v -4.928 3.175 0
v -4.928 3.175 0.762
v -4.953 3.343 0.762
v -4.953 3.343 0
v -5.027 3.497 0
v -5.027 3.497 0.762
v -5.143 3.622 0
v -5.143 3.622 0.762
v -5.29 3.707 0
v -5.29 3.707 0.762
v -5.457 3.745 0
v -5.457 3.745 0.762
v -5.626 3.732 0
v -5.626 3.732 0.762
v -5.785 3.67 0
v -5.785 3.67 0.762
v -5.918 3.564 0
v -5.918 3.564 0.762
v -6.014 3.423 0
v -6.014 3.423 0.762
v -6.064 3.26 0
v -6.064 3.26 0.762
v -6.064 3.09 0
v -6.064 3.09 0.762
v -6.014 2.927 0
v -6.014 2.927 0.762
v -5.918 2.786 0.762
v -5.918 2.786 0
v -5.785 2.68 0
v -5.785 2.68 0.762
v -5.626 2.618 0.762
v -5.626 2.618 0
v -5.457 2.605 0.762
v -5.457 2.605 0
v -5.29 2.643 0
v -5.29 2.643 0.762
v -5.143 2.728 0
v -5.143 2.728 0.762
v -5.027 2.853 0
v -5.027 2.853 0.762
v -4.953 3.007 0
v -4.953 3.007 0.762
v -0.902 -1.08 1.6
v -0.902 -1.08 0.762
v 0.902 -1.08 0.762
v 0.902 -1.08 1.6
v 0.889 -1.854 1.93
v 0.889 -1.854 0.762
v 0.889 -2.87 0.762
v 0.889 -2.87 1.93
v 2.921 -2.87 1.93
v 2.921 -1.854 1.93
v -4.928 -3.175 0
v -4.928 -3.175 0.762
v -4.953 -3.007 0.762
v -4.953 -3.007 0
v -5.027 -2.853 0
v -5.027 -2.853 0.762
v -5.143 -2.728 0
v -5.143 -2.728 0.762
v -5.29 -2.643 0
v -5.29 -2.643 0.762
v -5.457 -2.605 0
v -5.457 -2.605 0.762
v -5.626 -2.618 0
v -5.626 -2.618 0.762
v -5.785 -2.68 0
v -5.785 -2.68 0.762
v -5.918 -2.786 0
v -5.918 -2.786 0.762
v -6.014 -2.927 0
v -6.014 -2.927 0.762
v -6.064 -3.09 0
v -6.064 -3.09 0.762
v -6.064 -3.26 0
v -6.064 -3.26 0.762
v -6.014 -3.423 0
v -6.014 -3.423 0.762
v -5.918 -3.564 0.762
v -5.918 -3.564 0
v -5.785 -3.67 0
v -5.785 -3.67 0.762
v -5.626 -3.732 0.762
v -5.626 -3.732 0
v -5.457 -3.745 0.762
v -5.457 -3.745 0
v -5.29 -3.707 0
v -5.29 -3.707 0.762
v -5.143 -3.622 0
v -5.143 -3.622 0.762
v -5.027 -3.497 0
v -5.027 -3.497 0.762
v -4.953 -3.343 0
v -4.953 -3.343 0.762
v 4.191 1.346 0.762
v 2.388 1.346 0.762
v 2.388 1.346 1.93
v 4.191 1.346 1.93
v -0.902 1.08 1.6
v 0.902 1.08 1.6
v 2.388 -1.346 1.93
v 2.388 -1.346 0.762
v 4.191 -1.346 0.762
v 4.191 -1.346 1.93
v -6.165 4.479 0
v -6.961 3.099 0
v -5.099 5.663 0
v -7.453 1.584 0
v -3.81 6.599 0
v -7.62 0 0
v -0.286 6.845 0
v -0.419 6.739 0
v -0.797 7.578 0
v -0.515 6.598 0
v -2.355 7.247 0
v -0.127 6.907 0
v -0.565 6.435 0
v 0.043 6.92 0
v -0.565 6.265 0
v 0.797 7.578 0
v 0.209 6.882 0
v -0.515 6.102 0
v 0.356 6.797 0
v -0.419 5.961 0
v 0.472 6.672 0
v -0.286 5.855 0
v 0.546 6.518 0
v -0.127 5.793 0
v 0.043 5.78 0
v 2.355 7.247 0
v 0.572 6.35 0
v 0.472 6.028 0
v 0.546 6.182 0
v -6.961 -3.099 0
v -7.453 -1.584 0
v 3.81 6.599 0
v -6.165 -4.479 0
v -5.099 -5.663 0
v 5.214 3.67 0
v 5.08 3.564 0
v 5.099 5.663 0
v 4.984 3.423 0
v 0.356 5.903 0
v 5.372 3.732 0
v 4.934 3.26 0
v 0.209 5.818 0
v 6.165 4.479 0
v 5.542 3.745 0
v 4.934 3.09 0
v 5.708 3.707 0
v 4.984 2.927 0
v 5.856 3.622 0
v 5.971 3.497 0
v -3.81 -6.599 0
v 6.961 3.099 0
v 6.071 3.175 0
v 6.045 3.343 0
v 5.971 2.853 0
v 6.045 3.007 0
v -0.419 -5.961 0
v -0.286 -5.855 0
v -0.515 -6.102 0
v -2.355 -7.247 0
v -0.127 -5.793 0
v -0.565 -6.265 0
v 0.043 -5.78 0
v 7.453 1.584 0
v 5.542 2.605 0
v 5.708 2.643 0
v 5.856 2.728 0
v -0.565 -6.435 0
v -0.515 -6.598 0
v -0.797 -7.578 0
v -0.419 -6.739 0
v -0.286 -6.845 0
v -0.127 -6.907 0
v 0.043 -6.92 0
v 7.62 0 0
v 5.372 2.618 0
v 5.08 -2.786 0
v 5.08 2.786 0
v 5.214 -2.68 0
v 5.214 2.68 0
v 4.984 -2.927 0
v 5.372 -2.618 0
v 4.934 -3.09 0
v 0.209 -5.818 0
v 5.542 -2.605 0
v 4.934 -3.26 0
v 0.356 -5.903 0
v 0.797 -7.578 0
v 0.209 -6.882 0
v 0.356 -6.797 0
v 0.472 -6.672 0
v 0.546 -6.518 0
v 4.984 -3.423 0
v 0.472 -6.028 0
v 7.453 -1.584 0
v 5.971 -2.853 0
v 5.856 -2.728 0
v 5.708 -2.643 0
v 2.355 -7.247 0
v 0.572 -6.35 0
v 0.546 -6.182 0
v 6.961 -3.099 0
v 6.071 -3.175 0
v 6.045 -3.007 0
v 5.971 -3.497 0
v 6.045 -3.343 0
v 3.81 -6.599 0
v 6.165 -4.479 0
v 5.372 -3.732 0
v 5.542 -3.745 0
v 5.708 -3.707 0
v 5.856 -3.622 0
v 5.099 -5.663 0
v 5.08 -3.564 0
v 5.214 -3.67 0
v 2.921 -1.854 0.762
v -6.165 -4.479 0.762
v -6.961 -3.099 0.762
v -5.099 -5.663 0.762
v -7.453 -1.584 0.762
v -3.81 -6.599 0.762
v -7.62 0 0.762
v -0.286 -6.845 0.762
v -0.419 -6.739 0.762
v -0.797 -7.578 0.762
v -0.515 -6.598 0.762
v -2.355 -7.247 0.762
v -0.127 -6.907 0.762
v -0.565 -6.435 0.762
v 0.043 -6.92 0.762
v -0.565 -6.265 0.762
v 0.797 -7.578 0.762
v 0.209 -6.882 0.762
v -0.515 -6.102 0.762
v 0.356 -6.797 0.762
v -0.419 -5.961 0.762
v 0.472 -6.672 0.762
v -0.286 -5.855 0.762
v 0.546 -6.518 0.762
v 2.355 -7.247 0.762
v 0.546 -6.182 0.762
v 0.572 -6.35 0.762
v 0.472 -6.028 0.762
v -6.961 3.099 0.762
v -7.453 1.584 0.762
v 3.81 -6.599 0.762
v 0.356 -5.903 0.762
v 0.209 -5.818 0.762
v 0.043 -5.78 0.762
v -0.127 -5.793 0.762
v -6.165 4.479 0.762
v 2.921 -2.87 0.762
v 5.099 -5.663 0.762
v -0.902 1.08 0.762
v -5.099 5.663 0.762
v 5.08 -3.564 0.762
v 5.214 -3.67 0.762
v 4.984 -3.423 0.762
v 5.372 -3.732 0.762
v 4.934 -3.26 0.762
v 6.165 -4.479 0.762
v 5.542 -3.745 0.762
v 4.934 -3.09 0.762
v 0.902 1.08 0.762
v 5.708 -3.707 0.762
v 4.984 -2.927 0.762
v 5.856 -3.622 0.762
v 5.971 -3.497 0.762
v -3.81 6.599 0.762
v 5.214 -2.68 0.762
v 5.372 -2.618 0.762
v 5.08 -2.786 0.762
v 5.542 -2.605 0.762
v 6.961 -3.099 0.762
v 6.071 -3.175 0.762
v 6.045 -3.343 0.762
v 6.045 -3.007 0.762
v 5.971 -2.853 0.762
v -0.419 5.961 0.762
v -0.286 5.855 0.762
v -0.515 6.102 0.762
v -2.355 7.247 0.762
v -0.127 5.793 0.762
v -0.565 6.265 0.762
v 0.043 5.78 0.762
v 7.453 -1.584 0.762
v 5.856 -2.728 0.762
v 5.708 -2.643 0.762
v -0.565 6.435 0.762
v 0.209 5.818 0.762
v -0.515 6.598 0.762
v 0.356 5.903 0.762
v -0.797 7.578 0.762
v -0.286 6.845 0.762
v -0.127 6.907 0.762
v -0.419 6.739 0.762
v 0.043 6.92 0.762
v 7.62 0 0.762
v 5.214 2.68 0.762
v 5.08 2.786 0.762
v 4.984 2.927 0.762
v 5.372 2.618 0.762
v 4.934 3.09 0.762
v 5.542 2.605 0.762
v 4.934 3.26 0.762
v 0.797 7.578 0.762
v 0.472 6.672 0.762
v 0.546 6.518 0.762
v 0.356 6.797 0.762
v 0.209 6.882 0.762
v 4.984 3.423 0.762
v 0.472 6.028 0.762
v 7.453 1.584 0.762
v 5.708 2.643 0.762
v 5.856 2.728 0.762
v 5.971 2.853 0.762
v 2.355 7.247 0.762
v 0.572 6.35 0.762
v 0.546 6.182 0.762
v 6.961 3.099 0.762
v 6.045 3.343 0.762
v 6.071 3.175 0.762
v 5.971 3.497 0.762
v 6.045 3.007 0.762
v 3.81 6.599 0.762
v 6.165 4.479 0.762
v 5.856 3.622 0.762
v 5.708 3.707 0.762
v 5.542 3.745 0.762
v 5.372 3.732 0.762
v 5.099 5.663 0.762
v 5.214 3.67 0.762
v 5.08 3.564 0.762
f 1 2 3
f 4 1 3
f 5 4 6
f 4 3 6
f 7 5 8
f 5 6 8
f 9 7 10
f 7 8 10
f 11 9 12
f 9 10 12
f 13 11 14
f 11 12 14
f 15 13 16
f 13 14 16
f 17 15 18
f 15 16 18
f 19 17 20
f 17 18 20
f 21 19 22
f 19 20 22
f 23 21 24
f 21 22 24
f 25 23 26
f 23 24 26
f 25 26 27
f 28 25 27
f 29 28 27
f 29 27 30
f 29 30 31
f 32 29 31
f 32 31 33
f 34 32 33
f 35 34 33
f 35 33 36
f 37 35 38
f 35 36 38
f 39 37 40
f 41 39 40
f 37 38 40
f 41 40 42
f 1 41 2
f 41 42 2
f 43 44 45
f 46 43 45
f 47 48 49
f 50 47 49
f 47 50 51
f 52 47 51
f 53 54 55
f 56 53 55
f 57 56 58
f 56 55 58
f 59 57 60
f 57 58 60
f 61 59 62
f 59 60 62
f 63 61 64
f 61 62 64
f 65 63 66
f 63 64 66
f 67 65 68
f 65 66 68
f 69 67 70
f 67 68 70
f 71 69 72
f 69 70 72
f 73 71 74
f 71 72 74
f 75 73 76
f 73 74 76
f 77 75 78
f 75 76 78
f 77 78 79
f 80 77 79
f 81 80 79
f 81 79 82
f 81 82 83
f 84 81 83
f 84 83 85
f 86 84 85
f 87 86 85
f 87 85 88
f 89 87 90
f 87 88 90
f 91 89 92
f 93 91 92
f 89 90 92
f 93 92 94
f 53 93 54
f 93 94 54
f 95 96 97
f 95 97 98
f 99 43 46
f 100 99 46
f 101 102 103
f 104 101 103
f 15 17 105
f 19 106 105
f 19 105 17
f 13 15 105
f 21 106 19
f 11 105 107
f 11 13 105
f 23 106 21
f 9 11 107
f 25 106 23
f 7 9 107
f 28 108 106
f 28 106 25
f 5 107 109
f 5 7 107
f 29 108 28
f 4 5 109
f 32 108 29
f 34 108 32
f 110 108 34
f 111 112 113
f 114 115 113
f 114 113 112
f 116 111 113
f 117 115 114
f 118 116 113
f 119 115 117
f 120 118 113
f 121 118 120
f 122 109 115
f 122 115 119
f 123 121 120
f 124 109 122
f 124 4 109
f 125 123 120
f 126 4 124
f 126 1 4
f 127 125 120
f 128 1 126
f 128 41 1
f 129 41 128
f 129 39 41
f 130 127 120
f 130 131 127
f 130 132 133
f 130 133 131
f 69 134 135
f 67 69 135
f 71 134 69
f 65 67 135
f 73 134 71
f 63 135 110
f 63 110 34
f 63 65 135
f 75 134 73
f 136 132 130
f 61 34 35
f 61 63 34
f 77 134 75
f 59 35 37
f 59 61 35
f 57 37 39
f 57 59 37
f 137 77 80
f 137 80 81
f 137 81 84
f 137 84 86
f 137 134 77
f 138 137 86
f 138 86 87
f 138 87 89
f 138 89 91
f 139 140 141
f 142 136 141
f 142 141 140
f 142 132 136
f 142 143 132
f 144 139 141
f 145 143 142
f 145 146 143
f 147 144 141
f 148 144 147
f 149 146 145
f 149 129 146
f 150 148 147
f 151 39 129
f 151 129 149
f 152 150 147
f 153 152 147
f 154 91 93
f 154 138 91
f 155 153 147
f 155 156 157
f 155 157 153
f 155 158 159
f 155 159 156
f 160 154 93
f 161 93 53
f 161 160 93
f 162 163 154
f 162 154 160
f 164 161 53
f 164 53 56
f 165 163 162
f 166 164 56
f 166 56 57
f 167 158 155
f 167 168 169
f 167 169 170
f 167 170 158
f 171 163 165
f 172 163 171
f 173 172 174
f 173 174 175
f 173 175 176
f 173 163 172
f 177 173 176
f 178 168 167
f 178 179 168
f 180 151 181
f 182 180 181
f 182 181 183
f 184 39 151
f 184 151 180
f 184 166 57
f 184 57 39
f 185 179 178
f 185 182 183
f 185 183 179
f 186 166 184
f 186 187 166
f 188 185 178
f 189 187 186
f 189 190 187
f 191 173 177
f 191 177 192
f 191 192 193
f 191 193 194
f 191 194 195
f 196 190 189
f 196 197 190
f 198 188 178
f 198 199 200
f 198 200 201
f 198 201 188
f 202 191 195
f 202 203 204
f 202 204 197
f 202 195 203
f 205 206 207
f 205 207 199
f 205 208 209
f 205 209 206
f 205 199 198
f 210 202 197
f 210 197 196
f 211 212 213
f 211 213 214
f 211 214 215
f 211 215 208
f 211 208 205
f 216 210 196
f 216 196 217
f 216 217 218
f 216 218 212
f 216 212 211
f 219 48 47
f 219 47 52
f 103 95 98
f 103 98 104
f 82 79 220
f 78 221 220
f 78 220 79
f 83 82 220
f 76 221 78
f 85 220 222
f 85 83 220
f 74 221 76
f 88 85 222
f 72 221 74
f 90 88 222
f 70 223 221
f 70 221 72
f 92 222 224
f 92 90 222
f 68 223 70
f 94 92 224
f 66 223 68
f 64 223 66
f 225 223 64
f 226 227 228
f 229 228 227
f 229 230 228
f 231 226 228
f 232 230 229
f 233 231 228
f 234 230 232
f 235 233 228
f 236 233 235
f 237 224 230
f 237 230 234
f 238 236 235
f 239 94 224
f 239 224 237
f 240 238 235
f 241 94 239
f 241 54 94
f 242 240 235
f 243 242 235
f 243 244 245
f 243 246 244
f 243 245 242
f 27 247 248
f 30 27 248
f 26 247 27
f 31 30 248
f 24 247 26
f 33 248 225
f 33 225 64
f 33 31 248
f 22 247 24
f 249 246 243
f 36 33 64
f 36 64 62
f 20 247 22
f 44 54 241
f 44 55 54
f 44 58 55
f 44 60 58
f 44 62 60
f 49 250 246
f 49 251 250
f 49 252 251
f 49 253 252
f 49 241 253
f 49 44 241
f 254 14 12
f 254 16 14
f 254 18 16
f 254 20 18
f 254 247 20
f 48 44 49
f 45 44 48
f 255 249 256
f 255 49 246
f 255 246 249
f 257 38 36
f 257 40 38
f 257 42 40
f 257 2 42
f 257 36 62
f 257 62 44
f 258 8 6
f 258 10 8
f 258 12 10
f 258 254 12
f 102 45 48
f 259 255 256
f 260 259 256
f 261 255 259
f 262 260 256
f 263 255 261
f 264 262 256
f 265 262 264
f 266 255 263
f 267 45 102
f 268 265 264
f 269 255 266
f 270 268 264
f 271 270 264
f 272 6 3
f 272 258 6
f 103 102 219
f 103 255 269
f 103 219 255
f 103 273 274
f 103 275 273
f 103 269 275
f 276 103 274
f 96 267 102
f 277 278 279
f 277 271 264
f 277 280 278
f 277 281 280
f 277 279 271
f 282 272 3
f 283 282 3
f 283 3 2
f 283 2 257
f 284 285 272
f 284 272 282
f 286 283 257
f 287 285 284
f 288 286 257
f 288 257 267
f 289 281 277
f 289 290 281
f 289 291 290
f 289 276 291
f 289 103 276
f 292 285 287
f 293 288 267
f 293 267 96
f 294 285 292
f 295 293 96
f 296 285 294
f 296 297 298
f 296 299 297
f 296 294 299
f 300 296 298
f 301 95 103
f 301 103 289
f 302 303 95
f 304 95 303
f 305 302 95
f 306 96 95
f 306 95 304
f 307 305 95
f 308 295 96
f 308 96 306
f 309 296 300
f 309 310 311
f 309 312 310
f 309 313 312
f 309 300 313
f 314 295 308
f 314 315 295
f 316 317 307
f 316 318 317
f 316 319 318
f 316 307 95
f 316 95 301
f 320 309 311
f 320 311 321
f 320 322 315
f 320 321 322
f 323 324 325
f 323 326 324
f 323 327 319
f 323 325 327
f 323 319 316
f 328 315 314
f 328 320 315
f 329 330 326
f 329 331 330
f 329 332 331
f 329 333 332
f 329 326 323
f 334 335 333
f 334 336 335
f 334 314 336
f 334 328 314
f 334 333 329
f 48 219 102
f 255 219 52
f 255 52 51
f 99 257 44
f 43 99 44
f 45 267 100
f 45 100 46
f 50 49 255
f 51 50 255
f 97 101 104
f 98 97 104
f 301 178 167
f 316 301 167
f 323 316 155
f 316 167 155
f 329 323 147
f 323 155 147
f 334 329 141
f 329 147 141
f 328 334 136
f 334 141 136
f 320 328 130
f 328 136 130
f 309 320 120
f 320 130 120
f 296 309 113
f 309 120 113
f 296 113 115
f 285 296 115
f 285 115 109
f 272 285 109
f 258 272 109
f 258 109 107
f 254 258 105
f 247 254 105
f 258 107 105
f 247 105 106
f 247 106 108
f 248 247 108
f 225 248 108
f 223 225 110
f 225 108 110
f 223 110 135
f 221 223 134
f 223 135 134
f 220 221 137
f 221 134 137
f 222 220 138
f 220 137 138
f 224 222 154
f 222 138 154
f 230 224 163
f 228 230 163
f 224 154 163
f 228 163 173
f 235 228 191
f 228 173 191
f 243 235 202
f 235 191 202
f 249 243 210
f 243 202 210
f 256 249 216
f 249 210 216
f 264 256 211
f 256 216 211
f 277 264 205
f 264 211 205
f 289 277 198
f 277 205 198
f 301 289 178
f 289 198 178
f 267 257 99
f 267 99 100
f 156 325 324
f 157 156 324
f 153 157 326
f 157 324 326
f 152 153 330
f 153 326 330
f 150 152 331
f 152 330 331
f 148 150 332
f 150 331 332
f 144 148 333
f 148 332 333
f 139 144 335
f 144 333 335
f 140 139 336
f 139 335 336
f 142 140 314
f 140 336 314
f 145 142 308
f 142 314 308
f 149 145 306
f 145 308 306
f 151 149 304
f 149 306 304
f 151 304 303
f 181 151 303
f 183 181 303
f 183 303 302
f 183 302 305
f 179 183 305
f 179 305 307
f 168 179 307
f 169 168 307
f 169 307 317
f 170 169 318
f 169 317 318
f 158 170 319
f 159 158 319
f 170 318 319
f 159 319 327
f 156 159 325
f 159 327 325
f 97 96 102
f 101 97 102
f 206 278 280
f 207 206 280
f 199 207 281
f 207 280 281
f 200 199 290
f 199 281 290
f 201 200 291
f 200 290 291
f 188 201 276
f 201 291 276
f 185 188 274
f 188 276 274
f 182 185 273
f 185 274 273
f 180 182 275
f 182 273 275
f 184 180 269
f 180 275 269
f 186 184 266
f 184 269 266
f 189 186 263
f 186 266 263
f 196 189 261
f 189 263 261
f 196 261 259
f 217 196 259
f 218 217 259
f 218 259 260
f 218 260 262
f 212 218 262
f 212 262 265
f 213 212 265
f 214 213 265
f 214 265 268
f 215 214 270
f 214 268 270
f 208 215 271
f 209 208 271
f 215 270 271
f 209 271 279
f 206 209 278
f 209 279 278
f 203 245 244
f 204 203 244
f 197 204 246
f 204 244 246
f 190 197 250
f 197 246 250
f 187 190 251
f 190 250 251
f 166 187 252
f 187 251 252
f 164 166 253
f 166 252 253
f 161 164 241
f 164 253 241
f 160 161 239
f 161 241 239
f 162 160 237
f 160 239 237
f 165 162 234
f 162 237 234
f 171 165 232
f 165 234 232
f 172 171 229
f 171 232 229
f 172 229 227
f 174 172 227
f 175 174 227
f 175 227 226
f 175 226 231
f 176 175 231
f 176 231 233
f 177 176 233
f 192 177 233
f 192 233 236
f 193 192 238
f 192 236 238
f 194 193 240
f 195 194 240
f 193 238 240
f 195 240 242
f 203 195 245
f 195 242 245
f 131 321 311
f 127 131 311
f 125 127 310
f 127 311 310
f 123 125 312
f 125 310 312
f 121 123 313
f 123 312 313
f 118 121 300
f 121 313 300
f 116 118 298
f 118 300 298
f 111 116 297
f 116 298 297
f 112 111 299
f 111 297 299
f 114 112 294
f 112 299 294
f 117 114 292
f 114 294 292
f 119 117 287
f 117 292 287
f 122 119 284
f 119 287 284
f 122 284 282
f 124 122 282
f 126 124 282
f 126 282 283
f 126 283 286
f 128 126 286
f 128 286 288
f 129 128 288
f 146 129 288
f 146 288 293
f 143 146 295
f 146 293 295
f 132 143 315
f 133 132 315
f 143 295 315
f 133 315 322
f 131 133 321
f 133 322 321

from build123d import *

# Parameters (mm, degrees)
F0_R     = 7.62
F1_DEPTH = 0.762
F2_R     = 0.5715
F3_DEPTH = 0.762
F4_W     = 1.8034
F4_H     = 2.159
F5_DEPTH = 1.6002
F6_W     = 2.032
F6_H     = 1.016
F6_W_2   = 1.8034
F6_H_2   = 2.6924
F7_DEPTH = 1.9304


with BuildPart() as f1:
    # F0 (on Top) → F1 (new body)
    with BuildSketch(Plane.XY):
        Circle(F0_R)
    extrude(amount=F1_DEPTH)

    # F2 (on face) → F3 (cut, through all)
    with BuildSketch(Plane.XY.offset(0.762)):
        with Locations((0, 6.35)):
            Circle(F2_R)
        with Locations((-5.499261, 3.175)):
            Circle(F2_R)
        with Locations((-5.499261, -3.175)):
            Circle(F2_R)
        with Locations((0, -6.35)):
            Circle(F2_R)
        with Locations((5.499261, -3.175)):
            Circle(F2_R)
        with Locations((5.499261, 3.175)):
            Circle(F2_R)
    extrude(amount=-F3_DEPTH, mode=Mode.SUBTRACT)

    # F4 (on face) → F5 (join)
    with BuildSketch(Plane(origin=(0, 0, 0), x_dir=(1, 0, 0), z_dir=(0, 0, -1))):
        Rectangle(F4_W, F4_H)
    extrude(amount=-F5_DEPTH)

    # F6 (on face) → F7 (join)
    with BuildSketch(Plane(origin=(0, 0, 0), x_dir=(1, 0, 0), z_dir=(0, 0, -1))):
        with Locations((1.905, 2.3622)):
            Rectangle(F6_W, F6_H)
        with Locations((3.2893, 0)):
            Rectangle(F6_W_2, F6_H_2)
    extrude(amount=-F7_DEPTH)


solid = f1.part
